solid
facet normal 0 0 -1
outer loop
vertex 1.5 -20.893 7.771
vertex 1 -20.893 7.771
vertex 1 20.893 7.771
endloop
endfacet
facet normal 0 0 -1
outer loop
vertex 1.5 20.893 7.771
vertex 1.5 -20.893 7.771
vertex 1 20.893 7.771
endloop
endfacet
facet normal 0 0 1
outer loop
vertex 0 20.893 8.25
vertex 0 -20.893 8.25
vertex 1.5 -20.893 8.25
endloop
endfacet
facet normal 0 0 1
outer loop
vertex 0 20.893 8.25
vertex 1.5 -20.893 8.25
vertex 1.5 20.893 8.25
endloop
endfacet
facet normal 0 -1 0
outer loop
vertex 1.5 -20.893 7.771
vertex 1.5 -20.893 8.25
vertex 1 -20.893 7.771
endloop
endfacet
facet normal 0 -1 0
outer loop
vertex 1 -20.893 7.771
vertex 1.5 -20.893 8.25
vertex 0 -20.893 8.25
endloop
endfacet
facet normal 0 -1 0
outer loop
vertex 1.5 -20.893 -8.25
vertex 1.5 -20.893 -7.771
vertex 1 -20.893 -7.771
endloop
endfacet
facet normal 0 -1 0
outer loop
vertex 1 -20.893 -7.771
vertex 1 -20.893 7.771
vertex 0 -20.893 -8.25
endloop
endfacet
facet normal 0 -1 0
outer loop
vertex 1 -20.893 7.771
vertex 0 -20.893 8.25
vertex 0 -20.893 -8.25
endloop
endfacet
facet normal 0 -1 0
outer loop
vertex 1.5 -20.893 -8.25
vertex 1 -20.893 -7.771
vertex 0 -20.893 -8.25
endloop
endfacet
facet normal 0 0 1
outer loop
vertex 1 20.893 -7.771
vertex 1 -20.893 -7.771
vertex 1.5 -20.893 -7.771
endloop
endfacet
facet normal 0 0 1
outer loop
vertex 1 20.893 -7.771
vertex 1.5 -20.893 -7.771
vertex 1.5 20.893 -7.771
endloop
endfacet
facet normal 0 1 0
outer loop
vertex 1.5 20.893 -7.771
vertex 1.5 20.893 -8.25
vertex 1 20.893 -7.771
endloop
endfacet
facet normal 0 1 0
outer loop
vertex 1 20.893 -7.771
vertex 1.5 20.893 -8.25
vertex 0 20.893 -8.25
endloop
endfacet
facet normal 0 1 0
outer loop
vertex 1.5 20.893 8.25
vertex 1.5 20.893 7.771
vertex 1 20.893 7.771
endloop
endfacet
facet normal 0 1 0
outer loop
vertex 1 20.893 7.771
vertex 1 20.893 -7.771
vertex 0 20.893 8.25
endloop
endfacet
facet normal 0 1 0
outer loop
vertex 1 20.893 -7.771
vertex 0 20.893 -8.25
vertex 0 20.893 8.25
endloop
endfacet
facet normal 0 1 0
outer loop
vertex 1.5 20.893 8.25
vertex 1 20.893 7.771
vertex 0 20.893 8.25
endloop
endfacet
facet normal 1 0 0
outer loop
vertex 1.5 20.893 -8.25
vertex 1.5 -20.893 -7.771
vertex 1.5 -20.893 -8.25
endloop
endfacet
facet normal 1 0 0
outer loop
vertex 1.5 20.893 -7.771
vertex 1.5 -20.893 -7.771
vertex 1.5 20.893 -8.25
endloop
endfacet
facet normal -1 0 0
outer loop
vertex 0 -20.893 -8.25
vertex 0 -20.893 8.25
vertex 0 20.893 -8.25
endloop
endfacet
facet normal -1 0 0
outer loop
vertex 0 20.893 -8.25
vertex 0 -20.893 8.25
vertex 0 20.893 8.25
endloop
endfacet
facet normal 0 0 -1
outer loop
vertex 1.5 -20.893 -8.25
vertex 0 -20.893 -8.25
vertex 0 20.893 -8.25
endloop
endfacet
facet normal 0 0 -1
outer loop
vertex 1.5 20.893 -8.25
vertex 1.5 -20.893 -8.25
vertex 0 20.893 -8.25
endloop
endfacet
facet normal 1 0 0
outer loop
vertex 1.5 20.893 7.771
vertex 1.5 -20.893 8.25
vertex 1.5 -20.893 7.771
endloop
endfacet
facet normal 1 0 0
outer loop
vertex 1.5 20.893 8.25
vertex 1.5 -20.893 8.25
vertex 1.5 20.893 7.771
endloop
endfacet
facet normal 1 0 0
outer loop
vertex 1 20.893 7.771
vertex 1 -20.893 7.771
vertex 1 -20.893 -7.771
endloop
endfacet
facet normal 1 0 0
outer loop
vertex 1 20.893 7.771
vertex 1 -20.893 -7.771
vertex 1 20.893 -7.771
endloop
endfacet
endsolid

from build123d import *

# Parameters (mm, degrees)
F0_W     = 41.78606
F0_H     = 0.478756
F1_DEPTH = 1.5
F0_H_2   = 15.542488
F2_DEPTH = 1
F3_DEPTH = 1.5


with BuildPart() as f1:
    # F0 (on Right) → F1 (new body)
    with BuildSketch(Plane.YZ):
        with Locations((0, -8.010622)):
            Rectangle(F0_W, F0_H)
    extrude(amount=F1_DEPTH)

    # F0 (on Right) → F2 (join)
    with BuildSketch(Plane.YZ):
        with Locations((0, 8.010622)):
            Rectangle(F0_W, F0_H)
        Rectangle(F0_W, F0_H_2)
        with Locations((0, -8.010622)):
            Rectangle(F0_W, F0_H)
    extrude(amount=F2_DEPTH)

    # F0 (on Right) → F3 (join)
    with BuildSketch(Plane.YZ):
        with Locations((0, 8.010622)):
            Rectangle(F0_W, F0_H)
    extrude(amount=F3_DEPTH)


solid = f1.part
